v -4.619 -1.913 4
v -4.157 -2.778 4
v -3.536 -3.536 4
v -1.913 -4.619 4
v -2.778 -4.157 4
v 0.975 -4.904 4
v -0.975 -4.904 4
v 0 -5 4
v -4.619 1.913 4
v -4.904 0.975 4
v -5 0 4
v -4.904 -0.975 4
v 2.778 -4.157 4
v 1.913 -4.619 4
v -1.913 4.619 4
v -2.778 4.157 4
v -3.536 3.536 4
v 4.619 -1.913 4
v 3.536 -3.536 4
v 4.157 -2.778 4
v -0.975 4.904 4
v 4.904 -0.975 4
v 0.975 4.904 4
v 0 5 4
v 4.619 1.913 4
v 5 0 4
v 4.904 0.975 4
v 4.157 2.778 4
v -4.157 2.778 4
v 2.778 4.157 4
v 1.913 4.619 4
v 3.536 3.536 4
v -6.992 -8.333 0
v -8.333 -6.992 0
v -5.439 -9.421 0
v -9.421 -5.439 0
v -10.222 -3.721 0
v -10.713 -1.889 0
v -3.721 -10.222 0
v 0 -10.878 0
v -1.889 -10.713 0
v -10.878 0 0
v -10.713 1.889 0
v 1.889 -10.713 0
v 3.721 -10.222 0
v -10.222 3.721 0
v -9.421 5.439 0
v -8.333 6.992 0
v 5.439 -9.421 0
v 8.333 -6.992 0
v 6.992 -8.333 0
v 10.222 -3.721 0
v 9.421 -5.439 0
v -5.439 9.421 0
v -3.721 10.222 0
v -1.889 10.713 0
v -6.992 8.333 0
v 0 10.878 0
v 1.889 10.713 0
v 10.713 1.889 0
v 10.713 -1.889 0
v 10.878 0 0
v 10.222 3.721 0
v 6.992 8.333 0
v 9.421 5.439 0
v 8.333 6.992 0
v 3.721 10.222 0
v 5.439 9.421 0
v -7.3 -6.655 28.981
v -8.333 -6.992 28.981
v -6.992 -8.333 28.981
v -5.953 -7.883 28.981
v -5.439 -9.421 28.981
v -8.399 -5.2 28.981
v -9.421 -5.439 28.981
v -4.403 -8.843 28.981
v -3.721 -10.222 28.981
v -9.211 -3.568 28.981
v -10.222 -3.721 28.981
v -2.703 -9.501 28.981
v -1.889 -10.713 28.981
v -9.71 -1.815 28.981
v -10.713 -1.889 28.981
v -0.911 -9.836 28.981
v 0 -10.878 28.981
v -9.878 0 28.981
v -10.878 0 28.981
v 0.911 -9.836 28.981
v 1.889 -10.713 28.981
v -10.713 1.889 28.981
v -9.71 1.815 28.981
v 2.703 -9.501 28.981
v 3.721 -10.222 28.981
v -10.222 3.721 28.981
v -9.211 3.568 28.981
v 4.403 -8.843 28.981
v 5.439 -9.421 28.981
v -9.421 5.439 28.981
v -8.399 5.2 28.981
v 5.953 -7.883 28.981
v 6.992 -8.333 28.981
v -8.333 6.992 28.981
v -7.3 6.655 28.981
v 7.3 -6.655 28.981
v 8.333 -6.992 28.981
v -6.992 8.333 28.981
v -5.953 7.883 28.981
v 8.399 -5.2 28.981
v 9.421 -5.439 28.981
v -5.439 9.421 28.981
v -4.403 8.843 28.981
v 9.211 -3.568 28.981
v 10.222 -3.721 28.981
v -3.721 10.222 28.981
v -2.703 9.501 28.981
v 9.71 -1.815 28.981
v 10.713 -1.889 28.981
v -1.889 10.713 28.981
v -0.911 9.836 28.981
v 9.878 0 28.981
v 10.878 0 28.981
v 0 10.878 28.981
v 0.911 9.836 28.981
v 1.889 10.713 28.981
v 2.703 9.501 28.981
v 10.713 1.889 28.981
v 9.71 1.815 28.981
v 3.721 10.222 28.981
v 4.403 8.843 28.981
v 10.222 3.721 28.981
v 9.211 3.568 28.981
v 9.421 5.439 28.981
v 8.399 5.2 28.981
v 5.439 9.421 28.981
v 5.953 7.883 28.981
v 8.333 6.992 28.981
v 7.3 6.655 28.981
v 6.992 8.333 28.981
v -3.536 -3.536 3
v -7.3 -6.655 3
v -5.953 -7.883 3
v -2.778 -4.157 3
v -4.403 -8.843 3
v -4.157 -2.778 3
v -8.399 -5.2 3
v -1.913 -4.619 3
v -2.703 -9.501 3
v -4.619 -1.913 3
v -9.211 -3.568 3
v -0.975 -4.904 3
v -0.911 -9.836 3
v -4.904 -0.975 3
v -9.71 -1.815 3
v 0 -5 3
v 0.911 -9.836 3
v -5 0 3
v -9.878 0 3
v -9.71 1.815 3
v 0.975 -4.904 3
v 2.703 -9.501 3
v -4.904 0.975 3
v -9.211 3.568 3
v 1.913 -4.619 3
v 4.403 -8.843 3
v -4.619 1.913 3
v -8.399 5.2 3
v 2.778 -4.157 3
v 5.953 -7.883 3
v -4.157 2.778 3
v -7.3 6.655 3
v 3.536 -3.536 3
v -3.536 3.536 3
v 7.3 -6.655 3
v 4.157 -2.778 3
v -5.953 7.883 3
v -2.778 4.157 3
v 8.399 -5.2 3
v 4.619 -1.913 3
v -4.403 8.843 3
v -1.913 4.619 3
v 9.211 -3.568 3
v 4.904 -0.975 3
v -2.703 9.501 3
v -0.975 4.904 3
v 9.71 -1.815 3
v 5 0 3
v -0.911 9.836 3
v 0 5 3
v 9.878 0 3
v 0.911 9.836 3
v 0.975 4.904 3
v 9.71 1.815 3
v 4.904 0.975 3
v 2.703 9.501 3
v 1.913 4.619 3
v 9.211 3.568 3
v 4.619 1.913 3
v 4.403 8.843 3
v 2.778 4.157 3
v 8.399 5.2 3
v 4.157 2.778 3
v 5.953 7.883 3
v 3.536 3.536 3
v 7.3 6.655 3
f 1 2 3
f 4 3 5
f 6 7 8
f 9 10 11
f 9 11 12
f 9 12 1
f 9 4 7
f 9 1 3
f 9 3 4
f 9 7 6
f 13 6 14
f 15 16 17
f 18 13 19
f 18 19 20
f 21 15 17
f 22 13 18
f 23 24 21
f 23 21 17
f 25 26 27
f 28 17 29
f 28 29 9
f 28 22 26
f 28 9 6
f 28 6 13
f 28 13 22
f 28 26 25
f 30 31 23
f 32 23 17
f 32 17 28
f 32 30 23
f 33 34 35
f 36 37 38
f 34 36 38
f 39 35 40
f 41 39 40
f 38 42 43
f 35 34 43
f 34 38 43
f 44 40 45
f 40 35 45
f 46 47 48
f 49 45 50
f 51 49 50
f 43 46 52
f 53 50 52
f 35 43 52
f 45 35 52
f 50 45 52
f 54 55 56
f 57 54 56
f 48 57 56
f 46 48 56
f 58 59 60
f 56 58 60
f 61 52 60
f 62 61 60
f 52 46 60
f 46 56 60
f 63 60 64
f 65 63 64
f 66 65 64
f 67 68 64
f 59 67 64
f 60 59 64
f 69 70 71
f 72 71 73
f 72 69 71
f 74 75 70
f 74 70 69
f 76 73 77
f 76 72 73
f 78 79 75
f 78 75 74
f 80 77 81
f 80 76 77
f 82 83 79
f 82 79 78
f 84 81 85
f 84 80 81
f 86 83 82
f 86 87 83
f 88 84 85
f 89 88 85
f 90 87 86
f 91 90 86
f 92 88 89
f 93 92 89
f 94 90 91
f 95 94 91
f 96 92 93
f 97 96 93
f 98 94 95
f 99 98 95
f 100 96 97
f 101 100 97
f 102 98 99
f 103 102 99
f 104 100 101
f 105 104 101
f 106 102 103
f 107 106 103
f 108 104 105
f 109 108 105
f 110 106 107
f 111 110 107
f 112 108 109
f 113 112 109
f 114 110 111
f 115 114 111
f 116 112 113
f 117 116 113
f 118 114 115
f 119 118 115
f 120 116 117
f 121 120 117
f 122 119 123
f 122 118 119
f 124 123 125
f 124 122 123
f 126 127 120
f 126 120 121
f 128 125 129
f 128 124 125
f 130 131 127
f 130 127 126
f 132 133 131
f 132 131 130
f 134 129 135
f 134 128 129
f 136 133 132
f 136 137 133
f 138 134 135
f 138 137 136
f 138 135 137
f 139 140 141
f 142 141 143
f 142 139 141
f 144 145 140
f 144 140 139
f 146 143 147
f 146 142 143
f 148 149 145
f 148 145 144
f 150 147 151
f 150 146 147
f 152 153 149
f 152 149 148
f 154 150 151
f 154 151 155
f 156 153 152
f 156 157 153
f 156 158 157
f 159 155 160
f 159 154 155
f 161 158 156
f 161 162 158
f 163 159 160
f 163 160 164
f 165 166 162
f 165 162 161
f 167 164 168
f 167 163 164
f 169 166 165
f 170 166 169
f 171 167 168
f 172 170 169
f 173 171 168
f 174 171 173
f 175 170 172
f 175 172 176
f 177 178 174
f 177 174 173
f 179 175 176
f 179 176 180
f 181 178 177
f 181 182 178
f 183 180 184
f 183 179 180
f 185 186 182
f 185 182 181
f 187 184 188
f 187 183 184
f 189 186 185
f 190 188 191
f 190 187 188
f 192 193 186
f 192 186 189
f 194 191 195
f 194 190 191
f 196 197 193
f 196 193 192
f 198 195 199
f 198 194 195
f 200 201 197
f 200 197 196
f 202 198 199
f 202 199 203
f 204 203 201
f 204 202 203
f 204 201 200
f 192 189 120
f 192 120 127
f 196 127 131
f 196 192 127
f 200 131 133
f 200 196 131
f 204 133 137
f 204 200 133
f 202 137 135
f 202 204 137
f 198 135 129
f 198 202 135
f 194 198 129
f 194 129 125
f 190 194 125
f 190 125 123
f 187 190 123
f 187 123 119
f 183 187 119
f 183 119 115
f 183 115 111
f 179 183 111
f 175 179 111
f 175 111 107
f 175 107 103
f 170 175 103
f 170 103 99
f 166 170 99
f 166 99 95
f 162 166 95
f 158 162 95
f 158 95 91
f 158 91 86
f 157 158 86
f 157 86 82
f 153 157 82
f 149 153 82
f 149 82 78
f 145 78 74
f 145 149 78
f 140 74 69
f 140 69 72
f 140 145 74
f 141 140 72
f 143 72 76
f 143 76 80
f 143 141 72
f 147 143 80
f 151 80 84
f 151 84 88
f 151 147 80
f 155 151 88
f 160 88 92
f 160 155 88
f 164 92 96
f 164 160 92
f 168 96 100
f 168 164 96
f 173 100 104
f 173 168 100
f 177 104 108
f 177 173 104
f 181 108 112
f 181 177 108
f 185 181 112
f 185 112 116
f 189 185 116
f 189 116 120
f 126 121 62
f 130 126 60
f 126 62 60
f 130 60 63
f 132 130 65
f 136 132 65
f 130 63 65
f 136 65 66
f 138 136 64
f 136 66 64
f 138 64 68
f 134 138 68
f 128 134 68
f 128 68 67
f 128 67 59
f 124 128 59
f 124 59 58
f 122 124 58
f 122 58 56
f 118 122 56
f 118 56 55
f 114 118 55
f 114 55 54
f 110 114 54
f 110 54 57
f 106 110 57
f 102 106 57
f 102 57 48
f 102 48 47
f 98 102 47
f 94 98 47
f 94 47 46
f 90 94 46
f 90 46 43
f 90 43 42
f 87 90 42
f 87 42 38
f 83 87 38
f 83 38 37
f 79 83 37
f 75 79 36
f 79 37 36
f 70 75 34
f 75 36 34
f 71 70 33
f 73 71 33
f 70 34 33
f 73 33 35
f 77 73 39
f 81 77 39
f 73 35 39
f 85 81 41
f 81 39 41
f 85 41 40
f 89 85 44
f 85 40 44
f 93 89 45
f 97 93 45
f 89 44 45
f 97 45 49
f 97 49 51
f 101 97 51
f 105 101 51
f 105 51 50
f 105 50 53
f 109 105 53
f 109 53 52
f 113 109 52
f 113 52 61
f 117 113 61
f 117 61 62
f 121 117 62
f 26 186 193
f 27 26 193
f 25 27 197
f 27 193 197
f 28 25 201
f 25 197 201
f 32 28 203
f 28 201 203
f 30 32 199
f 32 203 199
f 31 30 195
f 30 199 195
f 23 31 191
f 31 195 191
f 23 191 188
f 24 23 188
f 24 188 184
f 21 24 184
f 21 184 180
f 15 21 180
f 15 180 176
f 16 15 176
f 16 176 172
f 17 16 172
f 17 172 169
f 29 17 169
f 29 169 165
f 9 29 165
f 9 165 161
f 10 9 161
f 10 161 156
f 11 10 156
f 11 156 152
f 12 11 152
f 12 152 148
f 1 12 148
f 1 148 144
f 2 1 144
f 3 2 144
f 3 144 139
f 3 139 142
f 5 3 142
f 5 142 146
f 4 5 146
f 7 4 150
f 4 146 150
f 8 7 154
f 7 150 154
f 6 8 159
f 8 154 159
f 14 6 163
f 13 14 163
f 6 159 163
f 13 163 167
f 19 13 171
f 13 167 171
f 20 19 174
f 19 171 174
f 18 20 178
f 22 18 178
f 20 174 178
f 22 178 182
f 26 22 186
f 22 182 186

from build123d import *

# Parameters (mm, degrees)
F0_R     = 10.8782
F0_R_2   = 9.8782
F0_R_3   = 6.5
F0_R_4   = 5.4
F0_R_5   = 5
F1_DEPTH = 3
F2_DEPTH = 28.9814
F3_DEPTH = 4


with BuildPart() as f1:
    # F0 (on Top) → F1 (new body)
    with BuildSketch(Plane.XY):
        Circle(F0_R)
        Circle(F0_R_2, mode=Mode.SUBTRACT)
        Circle(F0_R_2)
        Circle(F0_R_3, mode=Mode.SUBTRACT)
        Circle(F0_R_3)
        Circle(F0_R_4, mode=Mode.SUBTRACT)
        Circle(F0_R_4)
        Circle(F0_R_5, mode=Mode.SUBTRACT)
        Circle(F0_R_5)
    extrude(amount=F1_DEPTH)

    # F0 (on Top) → F2 (join)
    with BuildSketch(Plane.XY):
        Circle(F0_R)
        Circle(F0_R_2, mode=Mode.SUBTRACT)
    extrude(amount=F2_DEPTH)

    # F0 (on Top) → F3 (join)
    with BuildSketch(Plane.XY):
        Circle(F0_R_5)
    extrude(amount=F3_DEPTH)


solid = f1.part
